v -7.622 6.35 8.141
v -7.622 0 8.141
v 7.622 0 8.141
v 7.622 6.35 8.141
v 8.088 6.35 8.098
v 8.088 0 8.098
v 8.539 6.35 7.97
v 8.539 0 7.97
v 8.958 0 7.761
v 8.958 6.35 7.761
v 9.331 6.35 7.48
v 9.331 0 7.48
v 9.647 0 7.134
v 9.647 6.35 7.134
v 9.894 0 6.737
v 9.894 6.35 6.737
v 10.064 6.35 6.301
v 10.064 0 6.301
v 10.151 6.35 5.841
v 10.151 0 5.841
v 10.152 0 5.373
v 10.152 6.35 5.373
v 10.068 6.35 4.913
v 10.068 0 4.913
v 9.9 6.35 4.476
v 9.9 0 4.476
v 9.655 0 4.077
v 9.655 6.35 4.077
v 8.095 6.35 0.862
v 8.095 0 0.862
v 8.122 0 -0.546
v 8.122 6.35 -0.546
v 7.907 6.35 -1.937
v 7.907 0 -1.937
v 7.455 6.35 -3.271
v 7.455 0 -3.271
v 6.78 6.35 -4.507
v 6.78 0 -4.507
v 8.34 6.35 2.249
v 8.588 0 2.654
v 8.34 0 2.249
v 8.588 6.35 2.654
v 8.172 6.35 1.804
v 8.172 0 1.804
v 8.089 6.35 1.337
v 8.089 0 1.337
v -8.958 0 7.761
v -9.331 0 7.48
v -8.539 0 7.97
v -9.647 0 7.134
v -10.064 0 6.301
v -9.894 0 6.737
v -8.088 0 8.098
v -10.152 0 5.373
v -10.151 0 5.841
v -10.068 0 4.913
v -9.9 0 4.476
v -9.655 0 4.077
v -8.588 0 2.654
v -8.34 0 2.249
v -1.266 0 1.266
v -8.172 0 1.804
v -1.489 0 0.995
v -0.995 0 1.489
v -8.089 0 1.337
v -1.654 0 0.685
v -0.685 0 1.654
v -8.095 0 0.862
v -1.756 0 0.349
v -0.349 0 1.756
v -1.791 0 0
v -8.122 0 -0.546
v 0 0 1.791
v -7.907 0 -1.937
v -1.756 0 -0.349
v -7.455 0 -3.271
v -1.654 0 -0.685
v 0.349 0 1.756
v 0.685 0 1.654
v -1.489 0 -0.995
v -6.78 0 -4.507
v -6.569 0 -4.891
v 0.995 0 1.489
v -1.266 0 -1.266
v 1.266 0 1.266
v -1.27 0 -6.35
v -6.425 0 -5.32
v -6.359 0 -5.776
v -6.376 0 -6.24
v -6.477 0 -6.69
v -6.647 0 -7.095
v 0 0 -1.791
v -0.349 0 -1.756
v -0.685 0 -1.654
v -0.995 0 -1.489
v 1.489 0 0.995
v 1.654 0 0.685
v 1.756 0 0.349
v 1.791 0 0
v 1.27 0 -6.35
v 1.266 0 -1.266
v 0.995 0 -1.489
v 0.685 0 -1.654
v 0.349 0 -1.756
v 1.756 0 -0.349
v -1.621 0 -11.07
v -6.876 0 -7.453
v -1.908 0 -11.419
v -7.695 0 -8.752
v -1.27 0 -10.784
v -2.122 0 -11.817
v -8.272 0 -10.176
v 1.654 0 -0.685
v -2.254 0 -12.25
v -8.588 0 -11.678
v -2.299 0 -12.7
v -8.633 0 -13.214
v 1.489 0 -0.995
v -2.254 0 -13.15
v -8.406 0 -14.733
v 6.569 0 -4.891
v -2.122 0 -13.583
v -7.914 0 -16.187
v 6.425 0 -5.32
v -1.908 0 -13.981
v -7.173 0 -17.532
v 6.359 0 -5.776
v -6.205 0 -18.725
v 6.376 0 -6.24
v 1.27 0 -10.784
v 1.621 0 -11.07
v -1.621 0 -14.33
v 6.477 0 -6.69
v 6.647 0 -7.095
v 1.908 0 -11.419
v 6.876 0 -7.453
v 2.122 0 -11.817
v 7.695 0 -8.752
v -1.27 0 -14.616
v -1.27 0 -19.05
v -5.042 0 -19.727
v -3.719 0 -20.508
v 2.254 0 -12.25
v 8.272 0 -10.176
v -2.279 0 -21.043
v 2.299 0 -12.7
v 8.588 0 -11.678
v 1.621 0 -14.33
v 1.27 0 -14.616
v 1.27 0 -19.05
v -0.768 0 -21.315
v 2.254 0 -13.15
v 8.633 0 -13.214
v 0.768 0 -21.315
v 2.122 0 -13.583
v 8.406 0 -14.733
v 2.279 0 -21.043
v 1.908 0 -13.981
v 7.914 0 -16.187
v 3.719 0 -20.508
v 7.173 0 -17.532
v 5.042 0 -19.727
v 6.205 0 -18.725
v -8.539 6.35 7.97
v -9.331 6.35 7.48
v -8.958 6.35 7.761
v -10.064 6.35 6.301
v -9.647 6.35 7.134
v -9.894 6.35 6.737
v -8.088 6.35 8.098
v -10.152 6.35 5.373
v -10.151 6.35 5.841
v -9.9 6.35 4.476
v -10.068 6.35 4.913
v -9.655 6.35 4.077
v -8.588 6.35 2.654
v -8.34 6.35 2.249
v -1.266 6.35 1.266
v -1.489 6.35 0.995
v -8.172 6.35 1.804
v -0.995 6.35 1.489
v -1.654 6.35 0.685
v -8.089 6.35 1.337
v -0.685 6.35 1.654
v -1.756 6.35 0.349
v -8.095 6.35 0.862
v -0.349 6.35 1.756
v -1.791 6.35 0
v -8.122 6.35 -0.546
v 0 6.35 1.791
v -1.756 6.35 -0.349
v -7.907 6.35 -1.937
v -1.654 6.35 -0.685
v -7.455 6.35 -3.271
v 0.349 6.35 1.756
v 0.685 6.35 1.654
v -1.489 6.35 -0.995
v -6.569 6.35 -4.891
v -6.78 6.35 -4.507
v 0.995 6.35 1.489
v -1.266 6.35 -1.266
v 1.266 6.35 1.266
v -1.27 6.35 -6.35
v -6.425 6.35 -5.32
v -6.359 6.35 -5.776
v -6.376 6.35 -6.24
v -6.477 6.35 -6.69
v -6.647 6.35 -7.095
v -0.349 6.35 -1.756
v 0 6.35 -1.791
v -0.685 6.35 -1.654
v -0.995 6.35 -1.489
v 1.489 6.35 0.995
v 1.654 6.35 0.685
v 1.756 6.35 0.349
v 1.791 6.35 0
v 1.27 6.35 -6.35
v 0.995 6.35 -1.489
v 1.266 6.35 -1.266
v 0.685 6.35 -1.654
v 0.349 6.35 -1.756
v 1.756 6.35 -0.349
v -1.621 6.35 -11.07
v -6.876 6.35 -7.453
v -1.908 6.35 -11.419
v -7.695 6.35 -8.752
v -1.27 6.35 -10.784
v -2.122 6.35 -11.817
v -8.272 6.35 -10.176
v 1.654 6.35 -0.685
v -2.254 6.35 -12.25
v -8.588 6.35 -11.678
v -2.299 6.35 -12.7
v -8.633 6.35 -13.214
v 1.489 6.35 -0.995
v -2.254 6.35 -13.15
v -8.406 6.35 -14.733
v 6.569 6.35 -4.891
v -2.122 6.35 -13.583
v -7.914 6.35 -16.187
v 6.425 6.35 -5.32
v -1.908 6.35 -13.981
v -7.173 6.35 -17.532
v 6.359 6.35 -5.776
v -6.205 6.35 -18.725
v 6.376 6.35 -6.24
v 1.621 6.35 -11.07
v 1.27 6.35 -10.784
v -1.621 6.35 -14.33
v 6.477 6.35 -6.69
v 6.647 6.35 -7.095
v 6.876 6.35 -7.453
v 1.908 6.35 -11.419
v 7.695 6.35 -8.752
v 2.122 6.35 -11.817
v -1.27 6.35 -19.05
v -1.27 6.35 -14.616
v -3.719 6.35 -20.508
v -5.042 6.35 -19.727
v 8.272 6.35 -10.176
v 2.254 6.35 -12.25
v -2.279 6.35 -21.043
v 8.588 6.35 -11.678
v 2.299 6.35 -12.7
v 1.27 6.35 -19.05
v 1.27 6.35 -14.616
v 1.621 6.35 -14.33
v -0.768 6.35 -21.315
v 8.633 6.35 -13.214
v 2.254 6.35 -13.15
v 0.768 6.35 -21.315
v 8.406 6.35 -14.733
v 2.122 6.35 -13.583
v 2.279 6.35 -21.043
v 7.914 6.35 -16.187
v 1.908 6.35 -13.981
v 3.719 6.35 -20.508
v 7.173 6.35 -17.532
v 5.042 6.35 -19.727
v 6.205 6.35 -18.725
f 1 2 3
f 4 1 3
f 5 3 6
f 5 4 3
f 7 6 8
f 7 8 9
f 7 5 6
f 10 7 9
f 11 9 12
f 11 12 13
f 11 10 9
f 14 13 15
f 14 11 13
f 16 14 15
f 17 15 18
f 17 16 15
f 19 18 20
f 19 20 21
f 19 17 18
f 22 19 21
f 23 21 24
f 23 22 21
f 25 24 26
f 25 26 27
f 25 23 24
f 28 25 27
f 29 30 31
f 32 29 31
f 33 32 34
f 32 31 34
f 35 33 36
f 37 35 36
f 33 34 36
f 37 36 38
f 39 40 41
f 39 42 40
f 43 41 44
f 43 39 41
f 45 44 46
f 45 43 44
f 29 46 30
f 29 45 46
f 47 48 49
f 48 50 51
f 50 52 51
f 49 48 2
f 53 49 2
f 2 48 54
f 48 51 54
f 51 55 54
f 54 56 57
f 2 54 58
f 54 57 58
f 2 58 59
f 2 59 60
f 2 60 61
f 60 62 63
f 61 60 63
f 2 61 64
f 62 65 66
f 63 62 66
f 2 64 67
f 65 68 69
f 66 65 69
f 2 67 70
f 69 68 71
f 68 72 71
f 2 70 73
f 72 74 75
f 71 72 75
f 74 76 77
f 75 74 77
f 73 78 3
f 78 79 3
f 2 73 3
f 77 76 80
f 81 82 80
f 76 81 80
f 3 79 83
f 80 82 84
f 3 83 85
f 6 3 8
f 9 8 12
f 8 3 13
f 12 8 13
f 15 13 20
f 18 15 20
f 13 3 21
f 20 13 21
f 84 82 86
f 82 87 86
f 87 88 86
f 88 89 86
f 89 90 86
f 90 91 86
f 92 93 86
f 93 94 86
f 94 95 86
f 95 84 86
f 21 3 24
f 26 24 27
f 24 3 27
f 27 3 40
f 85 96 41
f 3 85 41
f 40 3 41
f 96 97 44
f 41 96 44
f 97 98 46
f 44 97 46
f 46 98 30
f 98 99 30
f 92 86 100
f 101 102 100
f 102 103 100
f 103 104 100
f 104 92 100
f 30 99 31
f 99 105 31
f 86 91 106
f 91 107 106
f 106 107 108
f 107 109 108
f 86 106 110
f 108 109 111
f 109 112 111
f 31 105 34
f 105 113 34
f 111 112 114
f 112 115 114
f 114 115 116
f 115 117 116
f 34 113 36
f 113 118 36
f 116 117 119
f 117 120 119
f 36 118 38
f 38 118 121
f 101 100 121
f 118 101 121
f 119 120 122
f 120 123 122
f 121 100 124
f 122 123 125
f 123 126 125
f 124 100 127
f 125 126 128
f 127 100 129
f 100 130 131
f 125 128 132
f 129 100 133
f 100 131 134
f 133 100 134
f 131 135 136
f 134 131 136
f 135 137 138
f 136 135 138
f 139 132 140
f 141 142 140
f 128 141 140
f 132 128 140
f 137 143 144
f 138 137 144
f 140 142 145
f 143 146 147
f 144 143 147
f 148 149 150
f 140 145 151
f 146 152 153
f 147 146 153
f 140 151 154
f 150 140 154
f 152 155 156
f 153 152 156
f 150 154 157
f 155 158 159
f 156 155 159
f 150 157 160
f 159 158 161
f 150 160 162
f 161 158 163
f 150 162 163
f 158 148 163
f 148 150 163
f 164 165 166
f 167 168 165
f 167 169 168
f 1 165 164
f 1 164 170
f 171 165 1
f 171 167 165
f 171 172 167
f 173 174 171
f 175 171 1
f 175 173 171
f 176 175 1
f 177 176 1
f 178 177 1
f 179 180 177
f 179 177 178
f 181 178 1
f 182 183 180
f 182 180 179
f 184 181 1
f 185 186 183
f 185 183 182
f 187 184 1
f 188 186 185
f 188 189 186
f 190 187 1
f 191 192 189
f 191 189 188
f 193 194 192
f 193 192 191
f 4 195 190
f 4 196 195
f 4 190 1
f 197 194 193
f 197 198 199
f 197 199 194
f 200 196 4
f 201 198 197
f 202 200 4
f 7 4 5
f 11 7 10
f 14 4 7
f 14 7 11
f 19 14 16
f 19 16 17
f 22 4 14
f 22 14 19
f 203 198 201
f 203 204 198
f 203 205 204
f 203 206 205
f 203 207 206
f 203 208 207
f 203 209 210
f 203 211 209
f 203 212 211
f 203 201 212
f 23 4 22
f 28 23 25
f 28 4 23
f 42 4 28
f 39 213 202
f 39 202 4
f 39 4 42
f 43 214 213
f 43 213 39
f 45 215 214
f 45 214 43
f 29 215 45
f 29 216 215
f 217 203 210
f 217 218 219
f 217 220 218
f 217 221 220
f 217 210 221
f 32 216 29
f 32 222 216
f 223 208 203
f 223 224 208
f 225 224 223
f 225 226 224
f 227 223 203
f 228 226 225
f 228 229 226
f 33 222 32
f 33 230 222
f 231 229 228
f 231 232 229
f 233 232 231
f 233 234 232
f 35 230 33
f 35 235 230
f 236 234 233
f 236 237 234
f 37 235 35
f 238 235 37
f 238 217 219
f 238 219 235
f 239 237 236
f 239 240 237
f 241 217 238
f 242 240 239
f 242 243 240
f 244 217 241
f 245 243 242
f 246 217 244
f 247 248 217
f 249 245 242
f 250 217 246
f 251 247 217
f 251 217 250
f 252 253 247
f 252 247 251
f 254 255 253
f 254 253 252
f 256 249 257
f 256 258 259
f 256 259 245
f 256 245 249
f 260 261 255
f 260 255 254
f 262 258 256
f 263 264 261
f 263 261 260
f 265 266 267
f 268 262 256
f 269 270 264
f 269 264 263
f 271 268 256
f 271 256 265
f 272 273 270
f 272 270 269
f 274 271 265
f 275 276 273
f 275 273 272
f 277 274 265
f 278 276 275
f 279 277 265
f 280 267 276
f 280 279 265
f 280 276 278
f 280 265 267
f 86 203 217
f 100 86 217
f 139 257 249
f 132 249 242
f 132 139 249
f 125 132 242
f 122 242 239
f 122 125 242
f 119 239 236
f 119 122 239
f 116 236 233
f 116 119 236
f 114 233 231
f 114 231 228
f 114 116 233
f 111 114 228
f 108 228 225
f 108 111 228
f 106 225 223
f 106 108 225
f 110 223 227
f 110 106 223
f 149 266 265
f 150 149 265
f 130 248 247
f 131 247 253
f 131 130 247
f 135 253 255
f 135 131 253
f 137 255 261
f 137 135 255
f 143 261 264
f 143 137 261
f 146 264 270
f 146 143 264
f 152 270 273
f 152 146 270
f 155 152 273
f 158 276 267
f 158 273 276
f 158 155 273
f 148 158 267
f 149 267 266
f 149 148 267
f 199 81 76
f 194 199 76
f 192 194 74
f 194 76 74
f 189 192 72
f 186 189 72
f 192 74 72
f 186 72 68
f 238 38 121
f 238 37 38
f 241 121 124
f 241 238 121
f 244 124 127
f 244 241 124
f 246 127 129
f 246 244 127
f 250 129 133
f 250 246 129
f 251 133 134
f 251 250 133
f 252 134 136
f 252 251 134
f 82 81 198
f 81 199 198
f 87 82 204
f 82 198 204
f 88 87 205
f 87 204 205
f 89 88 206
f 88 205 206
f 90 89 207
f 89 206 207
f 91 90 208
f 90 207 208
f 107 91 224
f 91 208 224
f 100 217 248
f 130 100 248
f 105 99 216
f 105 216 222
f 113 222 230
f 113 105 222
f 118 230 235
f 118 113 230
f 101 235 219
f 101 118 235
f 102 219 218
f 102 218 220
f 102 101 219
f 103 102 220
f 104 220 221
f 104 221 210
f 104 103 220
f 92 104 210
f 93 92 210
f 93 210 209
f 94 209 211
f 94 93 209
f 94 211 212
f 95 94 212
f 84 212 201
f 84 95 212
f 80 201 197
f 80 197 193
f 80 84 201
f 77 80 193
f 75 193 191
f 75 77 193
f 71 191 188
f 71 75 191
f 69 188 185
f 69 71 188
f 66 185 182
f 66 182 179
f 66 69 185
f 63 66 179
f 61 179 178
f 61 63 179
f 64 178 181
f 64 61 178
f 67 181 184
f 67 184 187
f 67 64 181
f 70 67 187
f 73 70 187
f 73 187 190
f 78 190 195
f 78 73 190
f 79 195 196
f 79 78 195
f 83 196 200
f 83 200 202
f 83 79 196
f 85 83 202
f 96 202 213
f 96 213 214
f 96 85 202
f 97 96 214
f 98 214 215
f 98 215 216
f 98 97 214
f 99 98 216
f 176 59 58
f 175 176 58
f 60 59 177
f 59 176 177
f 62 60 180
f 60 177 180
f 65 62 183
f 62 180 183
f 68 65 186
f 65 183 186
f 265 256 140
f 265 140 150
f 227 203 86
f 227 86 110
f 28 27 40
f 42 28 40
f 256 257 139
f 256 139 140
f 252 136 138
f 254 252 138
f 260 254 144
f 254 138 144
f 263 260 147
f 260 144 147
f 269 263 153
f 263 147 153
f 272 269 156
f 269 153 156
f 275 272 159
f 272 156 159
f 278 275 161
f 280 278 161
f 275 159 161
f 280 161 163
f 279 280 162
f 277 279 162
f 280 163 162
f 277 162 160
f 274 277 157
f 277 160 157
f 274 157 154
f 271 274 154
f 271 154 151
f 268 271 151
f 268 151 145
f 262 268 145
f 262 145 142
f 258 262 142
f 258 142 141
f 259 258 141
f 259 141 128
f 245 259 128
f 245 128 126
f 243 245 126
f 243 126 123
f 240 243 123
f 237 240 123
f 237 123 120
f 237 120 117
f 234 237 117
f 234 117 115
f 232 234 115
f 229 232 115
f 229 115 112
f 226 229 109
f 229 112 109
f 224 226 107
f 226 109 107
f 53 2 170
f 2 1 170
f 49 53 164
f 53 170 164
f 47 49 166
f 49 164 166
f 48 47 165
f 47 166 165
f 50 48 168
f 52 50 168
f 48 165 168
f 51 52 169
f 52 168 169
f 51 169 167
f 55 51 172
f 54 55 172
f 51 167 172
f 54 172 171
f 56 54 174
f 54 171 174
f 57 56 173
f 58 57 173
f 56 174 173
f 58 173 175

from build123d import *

# Parameters (mm, degrees)
SKETCH1_R           = 1.7907
SKETCH1_R_2         = 2.2987
BOSS_EXTRUDE1_DEPTH = 6.35
FILLET1_R           = 2.54
SKETCH2_W           = 2.54
SKETCH2_H           = 12.7
CUT_EXTRUDE1_DEPTH  = 6.35


with BuildPart() as part:
    # Sketch1 → Boss-Extrude1 (new body)
    with BuildSketch(Plane(origin=(0, 0, 0), x_dir=(1, 0, 0), z_dir=(0, 1, 0))):
        with BuildLine():
            Line((-12.7, -8.1407), (12.7, -8.1407))
            Line((12.7, -8.1407), (7.941309086, -1.7907))
            ThreePointArc((7.941309086, -1.7907), (7.76561659, 2.442579676), (5.48636952, 6.014212))
            ThreePointArc((5.48636952, 6.014212), (0, 21.3487), (-5.48636952, 6.014212))
            ThreePointArc((-5.48636952, 6.014212), (-7.76561659, 2.442579676), (-7.941309086, -1.7907))
            Line((-7.941309086, -1.7907), (-12.7, -8.1407))
        make_face()
        Circle(SKETCH1_R, mode=Mode.SUBTRACT)
        with Locations((0, 12.7)):
            Circle(SKETCH1_R_2, mode=Mode.SUBTRACT)
    extrude(amount=BOSS_EXTRUDE1_DEPTH)

    # Fillet1
    fillet1_edges = [part.edges().sort_by_distance(p)[0] for p in [
        (-7.941309086, 3.175, 1.7907),
        (-5.48636952, 3.175, -6.014212),
        (5.48636952, 3.175, -6.014212),
        (7.941309086, 3.175, 1.7907),
        (12.7, 3.175, 8.1407),
        (-12.7, 3.175, 8.1407),
    ]]
    fillet(fillet1_edges, radius=FILLET1_R)

    # Sketch2 → Cut-Extrude1 (cut)
    with BuildSketch(Plane(origin=(0, 6.35, 0), x_dir=(1, 0, 0), z_dir=(0, 1, 0))):
        with Locations((0, 12.7)):
            Rectangle(SKETCH2_W, SKETCH2_H)
    extrude(amount=-CUT_EXTRUDE1_DEPTH, mode=Mode.SUBTRACT)


solid = part.part
